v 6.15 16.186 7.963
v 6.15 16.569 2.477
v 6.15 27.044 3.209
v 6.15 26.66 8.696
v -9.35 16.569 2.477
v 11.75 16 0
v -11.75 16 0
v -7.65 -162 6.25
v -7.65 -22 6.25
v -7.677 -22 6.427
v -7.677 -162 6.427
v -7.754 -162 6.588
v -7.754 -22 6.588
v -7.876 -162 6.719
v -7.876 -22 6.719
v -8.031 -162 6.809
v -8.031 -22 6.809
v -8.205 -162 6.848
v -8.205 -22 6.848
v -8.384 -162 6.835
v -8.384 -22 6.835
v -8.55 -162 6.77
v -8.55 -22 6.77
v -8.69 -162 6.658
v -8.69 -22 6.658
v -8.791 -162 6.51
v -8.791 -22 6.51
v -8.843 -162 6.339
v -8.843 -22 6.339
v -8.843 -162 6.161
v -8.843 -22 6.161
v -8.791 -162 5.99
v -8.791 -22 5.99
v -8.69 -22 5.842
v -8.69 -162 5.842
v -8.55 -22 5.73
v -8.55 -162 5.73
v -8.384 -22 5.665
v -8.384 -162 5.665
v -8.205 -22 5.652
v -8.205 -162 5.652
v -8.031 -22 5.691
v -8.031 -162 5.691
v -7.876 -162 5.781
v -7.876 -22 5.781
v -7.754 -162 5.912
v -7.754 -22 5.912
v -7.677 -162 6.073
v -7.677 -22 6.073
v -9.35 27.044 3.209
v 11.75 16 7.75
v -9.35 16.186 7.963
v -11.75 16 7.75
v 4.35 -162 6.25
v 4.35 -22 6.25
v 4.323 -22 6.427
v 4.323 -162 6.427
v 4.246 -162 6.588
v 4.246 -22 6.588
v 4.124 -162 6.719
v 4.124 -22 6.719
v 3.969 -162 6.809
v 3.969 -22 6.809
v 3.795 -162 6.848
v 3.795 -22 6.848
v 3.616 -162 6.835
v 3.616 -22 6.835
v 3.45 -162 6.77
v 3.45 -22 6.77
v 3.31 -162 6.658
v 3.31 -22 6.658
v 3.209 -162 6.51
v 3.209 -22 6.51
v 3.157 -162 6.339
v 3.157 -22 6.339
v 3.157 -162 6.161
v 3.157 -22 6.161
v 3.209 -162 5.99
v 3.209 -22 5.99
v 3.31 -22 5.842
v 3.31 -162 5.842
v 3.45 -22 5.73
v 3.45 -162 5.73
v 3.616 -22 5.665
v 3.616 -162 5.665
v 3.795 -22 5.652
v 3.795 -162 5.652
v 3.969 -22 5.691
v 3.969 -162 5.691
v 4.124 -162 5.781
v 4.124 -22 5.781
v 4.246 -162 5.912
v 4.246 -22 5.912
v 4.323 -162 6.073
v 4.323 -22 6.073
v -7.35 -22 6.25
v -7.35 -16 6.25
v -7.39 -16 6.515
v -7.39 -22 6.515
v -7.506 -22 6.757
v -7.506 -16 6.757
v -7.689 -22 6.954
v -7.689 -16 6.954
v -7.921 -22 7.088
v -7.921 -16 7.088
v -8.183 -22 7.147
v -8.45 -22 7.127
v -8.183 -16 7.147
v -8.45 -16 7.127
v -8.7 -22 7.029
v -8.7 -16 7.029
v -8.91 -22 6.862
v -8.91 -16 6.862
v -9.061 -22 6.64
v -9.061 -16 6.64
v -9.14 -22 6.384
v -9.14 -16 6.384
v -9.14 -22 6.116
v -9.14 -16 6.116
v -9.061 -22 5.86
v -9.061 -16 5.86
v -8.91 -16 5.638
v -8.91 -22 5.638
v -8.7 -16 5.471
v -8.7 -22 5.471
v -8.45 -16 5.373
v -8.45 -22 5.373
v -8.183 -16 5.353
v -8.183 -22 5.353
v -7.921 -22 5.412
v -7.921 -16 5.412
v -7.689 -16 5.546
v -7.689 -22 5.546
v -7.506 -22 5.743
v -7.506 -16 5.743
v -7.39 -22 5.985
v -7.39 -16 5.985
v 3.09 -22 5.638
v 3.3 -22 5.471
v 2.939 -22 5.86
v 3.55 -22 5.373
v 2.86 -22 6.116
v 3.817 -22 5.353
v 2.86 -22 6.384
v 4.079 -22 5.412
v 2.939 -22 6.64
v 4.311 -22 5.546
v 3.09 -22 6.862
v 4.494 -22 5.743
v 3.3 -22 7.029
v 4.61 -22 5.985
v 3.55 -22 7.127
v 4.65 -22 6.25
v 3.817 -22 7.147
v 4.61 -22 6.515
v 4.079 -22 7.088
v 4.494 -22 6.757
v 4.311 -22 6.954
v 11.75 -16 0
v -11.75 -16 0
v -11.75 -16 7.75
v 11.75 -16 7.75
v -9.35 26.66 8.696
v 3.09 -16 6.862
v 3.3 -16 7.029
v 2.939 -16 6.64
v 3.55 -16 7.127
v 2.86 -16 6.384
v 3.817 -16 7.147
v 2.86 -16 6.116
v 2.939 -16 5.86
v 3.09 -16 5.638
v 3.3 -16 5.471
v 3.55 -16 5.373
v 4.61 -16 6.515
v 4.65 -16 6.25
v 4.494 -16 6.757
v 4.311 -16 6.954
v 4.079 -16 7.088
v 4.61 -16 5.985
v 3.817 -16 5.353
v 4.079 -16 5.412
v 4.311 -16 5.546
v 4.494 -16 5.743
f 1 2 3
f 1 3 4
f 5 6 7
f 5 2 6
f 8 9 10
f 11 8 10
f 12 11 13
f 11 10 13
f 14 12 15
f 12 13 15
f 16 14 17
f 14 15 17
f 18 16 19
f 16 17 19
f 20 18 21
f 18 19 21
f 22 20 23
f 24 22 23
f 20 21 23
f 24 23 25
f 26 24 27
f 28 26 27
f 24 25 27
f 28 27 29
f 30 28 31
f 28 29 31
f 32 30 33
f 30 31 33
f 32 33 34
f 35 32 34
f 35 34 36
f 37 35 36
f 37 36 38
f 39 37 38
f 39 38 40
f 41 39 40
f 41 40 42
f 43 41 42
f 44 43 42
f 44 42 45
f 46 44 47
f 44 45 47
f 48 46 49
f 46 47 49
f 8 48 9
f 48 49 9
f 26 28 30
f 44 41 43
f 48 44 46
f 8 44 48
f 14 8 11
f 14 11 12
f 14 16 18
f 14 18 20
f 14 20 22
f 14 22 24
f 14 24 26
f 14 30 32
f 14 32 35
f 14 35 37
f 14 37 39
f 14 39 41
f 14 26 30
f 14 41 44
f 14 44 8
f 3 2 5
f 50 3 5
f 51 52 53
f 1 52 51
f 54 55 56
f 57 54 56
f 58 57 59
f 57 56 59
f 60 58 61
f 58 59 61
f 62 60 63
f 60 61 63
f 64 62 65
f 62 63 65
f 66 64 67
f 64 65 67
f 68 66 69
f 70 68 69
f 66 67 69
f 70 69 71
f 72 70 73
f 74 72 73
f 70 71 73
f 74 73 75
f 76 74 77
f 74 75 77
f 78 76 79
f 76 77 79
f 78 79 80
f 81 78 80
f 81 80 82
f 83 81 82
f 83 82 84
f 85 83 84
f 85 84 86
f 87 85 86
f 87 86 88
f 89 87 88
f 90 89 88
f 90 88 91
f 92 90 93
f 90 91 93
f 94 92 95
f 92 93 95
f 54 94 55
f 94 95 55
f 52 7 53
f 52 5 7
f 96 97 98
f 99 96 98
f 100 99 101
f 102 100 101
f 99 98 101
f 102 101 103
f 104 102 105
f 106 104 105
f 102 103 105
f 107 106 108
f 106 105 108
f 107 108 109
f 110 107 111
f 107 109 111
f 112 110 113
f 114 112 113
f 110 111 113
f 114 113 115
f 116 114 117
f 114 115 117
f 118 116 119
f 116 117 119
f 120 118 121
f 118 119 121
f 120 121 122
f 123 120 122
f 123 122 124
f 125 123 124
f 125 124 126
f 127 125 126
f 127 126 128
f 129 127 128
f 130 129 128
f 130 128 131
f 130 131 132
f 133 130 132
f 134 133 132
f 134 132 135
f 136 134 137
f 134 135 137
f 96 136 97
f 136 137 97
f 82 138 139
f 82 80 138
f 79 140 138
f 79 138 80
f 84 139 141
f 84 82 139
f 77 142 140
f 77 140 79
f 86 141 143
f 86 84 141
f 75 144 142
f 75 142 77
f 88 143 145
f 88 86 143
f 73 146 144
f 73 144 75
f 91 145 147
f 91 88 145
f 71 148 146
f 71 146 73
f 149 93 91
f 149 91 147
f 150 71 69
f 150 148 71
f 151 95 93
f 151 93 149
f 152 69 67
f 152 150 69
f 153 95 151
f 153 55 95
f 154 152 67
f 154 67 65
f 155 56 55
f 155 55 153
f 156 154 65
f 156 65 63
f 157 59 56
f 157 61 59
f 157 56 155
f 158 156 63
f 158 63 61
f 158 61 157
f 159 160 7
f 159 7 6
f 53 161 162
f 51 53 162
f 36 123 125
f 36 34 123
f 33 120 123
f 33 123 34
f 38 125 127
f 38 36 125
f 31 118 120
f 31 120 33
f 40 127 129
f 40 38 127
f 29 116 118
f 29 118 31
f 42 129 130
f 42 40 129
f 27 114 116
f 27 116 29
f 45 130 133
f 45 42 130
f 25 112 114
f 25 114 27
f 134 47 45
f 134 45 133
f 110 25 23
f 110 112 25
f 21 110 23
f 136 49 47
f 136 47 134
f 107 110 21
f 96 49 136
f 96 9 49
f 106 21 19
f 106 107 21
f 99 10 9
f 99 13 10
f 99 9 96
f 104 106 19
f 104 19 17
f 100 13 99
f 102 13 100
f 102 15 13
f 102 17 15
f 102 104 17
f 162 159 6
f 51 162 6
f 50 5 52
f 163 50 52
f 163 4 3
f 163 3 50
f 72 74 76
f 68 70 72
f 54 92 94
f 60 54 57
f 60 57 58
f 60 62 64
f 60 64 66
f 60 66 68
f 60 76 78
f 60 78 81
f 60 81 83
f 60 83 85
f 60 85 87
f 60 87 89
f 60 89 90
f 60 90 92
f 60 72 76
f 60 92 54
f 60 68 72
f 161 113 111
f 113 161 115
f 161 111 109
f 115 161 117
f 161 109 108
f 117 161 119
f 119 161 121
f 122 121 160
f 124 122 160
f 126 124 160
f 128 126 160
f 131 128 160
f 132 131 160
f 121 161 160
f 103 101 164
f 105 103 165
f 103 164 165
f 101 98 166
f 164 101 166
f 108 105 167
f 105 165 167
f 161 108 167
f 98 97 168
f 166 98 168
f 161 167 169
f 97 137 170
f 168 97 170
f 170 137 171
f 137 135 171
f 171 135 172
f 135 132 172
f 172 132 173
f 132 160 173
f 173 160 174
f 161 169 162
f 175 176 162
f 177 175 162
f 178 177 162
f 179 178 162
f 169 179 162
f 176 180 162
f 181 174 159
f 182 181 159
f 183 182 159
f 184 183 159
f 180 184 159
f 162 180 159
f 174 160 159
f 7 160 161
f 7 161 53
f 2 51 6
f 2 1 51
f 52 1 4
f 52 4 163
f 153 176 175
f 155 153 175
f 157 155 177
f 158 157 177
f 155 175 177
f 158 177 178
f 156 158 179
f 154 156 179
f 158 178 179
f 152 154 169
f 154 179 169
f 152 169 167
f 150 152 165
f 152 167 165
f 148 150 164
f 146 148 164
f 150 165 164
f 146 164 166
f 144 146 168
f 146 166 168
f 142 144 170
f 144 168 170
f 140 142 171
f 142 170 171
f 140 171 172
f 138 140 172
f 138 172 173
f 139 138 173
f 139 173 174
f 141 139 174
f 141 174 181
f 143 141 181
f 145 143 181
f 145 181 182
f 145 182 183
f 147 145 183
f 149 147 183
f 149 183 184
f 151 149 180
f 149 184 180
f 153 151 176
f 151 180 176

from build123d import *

# Parameters (mm, degrees)
F0_W      = 23.5
F0_H      = 32
F1_DEPTH  = 7.75
F4_W      = 15.5
F4_H      = 5.5
F5_DEPTH  = 10.5
F1_FACE_W = 23.5
F1_FACE_H = 7.75
F5_FACE_W = 15.5
F5_FACE_H = 5.5
F7_R      = 0.9
F8_DEPTH  = 6
F9_R      = 0.6
F10_DEPTH = 140


with BuildPart() as f1:
    # F0 (on Top) → F1 (new body)
    with BuildSketch(Plane.XY):
        Rectangle(F0_W, F0_H)
    extrude(amount=F1_DEPTH)



with BuildPart() as f5:
    # F4 (on face) → F5 (new body)
    with BuildSketch(Plane(origin=(0, 16.6609531262, 1.1650473361), x_dir=(-1, 0, 0), z_dir=(0, 0.9975640503, 0.0697564737))):
        with Locations((1.6, 4.0650178096)):
            Rectangle(F4_W, F4_H)
    extrude(amount=F5_DEPTH)


with BuildPart() as f1_1:
    add(f1.part)

    add(f5.part)  # F6 merges F5
    # F1_face (on face) → F6 section 0
    with BuildSketch(Plane(origin=(0, 16, 3.875), x_dir=(-1, 0, 0), z_dir=(0, 1, 0))):
        Rectangle(F1_FACE_W, F1_FACE_H)
    # F5_face (on face) → F6 section 1
    with BuildSketch(Plane(origin=(-1.6, 16.3773918181, 5.2201629666), x_dir=(-1, 0, 0), z_dir=(0, -0.9975640503, -0.0697564737))):
        Rectangle(F5_FACE_W, F5_FACE_H)
    loft()

    # F7 (on face) → F8 (join)
    with BuildSketch(Plane.XZ.offset(16)):
        with Locations((-8.25, 6.25)):
            Circle(F7_R)
        with Locations((3.75, 6.25)):
            Circle(F7_R)
    extrude(amount=F8_DEPTH)

    # F9 (on face) → F10 (join)
    with BuildSketch(Plane.XZ.offset(22)):
        with Locations((-8.25, 6.25)):
            Circle(F9_R)
        with Locations((3.75, 6.25)):
            Circle(F9_R)
    extrude(amount=F10_DEPTH)


solid = f1_1.part
